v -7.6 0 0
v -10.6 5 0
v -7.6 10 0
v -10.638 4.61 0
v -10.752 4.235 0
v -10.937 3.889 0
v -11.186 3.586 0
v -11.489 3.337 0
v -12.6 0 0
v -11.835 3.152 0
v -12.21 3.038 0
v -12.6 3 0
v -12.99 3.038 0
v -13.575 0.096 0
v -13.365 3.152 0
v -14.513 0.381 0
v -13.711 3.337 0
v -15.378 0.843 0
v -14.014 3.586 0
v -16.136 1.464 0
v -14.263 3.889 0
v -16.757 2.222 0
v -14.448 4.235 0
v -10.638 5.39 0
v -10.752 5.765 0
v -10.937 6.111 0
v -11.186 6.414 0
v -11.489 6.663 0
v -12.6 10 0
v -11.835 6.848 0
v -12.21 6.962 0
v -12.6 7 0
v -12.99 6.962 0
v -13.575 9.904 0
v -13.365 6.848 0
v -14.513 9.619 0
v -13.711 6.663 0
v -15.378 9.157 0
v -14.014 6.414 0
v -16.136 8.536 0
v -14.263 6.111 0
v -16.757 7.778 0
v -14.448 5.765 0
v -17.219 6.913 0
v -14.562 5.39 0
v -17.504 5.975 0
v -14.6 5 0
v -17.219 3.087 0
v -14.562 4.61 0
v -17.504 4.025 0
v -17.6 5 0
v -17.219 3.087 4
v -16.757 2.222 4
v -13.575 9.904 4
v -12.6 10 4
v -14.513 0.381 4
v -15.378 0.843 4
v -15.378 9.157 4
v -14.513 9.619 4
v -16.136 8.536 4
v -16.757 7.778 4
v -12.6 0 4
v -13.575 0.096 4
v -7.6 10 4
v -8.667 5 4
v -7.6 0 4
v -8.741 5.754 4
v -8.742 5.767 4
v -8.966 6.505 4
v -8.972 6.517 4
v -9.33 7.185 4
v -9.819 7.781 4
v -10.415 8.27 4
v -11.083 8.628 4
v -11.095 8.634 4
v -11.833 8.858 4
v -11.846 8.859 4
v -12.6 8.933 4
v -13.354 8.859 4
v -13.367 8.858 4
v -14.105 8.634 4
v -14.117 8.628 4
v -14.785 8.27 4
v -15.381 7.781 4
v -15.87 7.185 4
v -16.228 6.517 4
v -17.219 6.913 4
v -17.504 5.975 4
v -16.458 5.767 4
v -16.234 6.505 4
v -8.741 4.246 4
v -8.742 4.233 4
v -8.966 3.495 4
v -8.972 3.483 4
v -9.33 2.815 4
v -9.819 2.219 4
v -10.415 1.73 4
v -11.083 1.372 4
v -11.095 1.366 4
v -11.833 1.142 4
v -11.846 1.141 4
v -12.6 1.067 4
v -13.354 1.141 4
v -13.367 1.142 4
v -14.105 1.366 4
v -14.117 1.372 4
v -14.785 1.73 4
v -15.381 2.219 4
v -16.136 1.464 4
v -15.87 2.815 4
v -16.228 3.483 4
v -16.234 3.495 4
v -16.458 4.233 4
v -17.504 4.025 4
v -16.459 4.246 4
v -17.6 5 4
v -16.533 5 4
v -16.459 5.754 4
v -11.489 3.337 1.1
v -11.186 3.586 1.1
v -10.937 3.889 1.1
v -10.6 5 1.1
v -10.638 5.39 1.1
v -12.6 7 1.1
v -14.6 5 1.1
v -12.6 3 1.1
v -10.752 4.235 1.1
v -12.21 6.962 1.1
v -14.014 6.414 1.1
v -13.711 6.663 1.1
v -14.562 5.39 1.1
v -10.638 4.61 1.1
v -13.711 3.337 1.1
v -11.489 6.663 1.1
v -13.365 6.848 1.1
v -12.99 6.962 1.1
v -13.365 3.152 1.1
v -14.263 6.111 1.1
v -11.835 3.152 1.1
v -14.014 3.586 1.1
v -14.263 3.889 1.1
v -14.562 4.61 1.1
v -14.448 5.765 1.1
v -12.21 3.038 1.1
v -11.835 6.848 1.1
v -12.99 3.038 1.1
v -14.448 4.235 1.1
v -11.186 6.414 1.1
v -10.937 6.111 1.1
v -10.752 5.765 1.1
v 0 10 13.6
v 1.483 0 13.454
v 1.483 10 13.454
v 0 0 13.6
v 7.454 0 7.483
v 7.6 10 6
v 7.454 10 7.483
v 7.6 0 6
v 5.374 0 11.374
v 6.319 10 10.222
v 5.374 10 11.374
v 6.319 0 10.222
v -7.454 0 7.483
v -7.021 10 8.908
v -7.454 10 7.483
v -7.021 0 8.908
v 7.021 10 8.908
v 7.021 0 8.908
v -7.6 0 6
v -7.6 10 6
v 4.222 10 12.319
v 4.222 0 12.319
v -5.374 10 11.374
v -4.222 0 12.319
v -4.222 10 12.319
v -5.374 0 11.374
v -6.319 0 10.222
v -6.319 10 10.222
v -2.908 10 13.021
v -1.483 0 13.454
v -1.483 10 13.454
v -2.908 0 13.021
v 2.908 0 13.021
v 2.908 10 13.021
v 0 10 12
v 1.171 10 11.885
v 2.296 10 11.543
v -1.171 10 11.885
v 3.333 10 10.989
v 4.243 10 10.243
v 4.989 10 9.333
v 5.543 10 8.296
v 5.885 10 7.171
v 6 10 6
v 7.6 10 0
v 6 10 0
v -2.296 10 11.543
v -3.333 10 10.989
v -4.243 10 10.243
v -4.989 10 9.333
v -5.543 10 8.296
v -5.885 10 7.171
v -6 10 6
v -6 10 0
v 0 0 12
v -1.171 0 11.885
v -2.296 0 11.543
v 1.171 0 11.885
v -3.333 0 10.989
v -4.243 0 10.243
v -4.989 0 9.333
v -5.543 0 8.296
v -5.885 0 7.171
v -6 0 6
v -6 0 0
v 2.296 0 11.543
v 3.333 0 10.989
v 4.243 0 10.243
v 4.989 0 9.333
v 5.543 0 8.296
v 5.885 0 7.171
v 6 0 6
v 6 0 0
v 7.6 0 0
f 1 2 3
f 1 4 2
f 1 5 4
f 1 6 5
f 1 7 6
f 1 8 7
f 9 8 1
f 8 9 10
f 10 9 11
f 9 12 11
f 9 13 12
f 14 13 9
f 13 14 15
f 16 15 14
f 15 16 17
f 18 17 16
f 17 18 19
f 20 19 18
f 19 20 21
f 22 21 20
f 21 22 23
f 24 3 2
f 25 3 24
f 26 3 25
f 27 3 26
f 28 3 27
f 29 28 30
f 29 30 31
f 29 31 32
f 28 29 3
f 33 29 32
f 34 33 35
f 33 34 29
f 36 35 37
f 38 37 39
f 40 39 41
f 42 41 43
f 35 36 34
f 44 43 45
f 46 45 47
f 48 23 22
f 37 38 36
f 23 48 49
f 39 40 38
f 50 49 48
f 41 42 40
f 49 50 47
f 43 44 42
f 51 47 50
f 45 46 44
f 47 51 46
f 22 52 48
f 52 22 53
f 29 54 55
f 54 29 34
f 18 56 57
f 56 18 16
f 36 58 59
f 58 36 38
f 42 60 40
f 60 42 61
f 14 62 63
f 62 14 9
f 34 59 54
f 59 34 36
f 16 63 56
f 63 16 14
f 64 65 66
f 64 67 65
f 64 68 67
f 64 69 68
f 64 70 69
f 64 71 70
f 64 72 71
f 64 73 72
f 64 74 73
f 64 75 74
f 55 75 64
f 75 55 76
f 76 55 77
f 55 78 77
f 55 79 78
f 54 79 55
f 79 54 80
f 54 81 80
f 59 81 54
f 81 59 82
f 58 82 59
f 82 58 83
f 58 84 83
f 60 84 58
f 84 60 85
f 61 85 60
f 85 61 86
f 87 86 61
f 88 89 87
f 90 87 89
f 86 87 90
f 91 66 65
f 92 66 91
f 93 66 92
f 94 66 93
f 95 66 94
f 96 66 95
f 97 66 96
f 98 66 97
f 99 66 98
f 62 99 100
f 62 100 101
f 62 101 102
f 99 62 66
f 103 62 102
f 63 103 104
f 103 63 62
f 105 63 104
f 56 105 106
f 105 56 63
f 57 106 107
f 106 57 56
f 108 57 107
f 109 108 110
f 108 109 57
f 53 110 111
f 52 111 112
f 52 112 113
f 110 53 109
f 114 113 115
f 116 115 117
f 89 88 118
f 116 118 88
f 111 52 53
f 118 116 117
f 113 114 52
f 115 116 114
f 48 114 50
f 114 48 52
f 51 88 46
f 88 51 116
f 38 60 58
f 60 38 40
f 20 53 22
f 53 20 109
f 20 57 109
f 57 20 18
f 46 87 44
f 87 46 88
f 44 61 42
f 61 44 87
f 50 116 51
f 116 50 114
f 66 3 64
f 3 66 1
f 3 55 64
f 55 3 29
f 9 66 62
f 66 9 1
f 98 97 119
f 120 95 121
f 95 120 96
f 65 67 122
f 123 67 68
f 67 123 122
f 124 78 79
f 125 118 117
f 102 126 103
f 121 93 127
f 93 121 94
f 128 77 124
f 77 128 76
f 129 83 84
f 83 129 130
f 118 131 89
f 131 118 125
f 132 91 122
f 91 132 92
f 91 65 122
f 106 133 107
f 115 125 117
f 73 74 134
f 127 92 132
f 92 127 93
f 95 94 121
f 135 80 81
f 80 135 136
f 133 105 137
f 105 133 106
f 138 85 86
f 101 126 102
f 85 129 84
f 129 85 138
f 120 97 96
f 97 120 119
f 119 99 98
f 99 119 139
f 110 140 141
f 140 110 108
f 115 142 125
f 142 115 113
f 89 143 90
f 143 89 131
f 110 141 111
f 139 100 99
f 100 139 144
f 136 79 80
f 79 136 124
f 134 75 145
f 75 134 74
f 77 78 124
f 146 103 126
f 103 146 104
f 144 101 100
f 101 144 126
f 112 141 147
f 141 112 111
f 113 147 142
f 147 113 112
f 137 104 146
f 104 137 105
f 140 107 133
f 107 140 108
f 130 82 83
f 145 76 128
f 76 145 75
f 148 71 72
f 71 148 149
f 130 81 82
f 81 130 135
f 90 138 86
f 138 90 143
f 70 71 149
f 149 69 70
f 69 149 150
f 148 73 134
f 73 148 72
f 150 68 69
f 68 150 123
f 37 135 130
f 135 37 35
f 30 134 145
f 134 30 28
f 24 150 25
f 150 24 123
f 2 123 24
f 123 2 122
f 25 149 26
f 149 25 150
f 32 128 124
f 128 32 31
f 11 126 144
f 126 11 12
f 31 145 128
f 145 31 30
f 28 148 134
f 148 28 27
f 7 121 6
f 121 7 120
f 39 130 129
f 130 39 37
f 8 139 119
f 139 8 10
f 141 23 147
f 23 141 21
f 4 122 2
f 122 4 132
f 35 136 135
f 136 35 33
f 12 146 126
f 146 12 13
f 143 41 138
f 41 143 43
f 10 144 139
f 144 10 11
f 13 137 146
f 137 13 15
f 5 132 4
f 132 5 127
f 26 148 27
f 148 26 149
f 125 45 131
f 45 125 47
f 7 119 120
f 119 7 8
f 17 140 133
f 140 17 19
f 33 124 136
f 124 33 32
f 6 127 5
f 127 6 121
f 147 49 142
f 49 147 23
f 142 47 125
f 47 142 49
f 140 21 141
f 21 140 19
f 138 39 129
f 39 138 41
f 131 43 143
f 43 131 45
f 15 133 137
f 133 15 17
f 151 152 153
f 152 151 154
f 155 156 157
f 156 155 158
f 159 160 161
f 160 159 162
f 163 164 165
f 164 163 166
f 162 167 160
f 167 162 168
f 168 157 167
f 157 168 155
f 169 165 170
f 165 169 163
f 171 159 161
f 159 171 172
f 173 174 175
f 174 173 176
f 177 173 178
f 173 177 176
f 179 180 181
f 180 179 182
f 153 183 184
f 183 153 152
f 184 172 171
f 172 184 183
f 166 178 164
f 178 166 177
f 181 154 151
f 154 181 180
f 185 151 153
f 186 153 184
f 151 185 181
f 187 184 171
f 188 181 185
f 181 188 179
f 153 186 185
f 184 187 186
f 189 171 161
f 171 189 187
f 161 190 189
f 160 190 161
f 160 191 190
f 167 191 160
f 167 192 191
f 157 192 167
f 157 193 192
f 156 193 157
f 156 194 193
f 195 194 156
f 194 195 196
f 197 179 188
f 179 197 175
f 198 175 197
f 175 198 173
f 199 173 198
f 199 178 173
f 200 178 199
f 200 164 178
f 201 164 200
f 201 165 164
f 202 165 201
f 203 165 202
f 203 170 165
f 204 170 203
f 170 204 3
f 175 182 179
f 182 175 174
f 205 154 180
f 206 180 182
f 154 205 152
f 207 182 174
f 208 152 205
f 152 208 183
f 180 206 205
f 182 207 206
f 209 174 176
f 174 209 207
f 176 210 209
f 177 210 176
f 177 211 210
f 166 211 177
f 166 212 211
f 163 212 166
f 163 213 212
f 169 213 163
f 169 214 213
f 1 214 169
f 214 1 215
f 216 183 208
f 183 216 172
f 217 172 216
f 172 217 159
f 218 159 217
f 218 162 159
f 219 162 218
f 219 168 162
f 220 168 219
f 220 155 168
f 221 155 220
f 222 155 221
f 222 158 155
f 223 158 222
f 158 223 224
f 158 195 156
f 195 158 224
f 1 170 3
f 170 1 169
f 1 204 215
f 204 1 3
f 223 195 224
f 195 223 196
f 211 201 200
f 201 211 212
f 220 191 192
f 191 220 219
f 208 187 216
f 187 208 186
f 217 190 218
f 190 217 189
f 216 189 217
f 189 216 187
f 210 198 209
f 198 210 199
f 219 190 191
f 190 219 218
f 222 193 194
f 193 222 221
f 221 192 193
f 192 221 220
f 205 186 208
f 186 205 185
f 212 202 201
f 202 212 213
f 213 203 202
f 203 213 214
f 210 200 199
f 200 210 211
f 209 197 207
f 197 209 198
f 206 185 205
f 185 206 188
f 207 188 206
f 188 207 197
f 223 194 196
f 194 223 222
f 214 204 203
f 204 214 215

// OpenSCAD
$fn=32;
t=0.4;


translate([-6-5-t*4,0,0]) difference() {
  union() {
    translate([0,5,0]) cylinder(r=5,h=4);
    cube([5,10,4]);
  }
  translate([0,5,1.1]) screw();
}


translate([0,0,6]) rotate([-90,0,0]) difference() {
  union() {
    cylinder(r=6+t*4,h=10);
    translate([-(6+t*4),0,0]) cube([(6+t*4)*2,6,10]);
  }
  translate([0,0,-0.1]) {
    cylinder(r=6,h=10.2);
    translate([-6,0,0]) cube([12,10,10.2]);
  }
}

module screw() {
  cylinder(r1=2, r2=4, h=3);
  translate([0,0,-4]) cylinder(r=2, h=5);
}
